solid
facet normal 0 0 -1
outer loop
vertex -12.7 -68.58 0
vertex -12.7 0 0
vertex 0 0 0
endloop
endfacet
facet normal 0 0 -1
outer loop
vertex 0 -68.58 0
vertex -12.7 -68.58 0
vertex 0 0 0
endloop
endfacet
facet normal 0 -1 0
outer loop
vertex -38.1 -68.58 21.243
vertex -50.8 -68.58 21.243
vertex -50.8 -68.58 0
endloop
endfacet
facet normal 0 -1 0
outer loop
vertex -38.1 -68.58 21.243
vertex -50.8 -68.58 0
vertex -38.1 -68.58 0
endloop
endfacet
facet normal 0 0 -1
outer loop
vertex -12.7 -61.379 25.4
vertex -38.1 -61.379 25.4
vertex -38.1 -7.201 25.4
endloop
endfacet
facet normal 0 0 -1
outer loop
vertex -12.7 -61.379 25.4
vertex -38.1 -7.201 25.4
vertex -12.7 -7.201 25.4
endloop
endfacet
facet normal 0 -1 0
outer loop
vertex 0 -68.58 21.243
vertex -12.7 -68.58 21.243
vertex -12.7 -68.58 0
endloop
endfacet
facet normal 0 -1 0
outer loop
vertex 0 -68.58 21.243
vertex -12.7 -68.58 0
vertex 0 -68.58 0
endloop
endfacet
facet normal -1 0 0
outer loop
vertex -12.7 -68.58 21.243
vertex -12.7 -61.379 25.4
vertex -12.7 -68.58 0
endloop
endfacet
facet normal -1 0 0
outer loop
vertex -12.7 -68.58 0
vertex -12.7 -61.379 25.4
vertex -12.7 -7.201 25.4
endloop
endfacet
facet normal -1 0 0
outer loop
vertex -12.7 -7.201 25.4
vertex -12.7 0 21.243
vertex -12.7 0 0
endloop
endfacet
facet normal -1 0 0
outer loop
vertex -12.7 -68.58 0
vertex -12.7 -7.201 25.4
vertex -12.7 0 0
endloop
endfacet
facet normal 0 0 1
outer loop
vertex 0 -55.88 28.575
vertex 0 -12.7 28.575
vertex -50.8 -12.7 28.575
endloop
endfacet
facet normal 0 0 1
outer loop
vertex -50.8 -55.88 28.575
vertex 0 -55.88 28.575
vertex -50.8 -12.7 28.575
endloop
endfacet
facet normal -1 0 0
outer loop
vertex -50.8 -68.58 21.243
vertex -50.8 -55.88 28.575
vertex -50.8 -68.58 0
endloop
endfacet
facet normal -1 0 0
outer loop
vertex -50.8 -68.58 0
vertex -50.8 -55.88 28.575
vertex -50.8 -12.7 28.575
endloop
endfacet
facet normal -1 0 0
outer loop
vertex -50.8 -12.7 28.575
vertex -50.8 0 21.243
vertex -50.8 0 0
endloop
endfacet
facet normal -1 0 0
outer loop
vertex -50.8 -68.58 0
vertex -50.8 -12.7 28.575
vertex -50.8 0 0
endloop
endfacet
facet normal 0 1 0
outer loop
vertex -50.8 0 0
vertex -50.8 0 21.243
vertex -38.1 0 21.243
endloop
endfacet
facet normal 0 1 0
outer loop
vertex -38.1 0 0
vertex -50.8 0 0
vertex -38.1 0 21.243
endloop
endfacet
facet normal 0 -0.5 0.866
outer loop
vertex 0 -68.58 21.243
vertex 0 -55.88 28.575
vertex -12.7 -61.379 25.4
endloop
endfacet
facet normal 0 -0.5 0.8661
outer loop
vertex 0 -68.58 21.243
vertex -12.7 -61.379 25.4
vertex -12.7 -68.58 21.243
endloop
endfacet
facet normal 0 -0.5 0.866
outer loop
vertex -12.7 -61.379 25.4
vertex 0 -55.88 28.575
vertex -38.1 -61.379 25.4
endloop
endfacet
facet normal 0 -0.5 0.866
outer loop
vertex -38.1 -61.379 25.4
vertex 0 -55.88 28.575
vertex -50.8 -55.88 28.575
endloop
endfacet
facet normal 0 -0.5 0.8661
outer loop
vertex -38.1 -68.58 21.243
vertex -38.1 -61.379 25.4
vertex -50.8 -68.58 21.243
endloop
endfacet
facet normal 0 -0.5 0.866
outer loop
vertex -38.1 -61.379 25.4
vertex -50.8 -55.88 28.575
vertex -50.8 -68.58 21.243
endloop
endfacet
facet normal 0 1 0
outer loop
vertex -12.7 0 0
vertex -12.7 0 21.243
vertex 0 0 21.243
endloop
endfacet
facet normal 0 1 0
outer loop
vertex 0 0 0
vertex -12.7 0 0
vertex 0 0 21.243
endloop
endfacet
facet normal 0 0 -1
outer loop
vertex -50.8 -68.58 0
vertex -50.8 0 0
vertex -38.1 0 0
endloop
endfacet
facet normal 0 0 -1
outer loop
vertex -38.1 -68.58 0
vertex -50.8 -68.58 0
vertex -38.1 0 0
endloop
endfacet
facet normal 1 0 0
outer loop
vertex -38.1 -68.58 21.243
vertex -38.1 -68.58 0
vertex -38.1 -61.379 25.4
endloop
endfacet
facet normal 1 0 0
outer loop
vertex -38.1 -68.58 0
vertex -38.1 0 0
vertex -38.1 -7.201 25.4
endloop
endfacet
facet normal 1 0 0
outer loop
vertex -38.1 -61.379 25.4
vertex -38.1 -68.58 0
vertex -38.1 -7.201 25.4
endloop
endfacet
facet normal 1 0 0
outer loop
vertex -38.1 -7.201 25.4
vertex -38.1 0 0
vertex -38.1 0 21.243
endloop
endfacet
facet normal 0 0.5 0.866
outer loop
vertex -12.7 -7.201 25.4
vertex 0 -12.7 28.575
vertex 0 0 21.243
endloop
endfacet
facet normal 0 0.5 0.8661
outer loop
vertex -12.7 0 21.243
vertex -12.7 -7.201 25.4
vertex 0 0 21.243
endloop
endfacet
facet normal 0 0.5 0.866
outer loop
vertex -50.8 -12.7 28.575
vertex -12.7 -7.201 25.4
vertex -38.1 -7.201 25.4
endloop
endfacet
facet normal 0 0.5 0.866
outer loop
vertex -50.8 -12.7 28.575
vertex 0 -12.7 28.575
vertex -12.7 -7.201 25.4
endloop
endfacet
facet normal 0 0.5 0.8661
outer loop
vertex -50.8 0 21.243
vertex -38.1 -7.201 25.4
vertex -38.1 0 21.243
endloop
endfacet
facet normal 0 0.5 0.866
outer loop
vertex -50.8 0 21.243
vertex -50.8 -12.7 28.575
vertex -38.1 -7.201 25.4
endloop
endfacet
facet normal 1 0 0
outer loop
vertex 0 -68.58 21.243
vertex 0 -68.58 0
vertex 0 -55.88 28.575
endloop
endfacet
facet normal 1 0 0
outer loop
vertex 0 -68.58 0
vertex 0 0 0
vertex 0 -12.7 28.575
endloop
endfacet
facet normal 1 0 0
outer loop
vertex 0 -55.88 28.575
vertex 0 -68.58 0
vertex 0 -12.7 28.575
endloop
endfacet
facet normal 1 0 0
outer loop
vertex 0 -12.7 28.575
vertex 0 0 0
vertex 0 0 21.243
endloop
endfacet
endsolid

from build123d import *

# Parameters (mm, degrees)
F1_DEPTH    = 68.58
F2_T1_DEPTH = 116.511978168


# Not quite as in the source:
# - a fillet or chamfer that OpenCascade refuses, or shapes differently, is made with other operations: its cross-section is extruded or revolved along the edge and cut away or added


with BuildPart() as f1:
    # F0 (on Front) → F1 (new body)
    with BuildSketch(Plane.XZ):
        Polygon((-12.7, 0), (0, 0), (0, 28.575), (-50.8, 28.575), (-50.8, 0), (-38.1, 0), (-38.1, 25.4), (-12.7, 25.4), align=None)
    extrude(amount=F1_DEPTH)

    # F2: chamfer of 12.7 x 7.3323484187 on 2 edges, made by hand

    # F2_s2 → F2_t1 (cut)
    with BuildSketch(Plane.YZ.offset(-83.655989084)):
        Polygon((-12.7, 28.575), (0, 21.2426515813), (0, 28.575), align=None)
        Polygon((-55.88, 28.575), (-68.58, 21.2426515813), (-68.58, 28.575), align=None)
    extrude(amount=F2_T1_DEPTH, mode=Mode.SUBTRACT)


solid = f1.part
